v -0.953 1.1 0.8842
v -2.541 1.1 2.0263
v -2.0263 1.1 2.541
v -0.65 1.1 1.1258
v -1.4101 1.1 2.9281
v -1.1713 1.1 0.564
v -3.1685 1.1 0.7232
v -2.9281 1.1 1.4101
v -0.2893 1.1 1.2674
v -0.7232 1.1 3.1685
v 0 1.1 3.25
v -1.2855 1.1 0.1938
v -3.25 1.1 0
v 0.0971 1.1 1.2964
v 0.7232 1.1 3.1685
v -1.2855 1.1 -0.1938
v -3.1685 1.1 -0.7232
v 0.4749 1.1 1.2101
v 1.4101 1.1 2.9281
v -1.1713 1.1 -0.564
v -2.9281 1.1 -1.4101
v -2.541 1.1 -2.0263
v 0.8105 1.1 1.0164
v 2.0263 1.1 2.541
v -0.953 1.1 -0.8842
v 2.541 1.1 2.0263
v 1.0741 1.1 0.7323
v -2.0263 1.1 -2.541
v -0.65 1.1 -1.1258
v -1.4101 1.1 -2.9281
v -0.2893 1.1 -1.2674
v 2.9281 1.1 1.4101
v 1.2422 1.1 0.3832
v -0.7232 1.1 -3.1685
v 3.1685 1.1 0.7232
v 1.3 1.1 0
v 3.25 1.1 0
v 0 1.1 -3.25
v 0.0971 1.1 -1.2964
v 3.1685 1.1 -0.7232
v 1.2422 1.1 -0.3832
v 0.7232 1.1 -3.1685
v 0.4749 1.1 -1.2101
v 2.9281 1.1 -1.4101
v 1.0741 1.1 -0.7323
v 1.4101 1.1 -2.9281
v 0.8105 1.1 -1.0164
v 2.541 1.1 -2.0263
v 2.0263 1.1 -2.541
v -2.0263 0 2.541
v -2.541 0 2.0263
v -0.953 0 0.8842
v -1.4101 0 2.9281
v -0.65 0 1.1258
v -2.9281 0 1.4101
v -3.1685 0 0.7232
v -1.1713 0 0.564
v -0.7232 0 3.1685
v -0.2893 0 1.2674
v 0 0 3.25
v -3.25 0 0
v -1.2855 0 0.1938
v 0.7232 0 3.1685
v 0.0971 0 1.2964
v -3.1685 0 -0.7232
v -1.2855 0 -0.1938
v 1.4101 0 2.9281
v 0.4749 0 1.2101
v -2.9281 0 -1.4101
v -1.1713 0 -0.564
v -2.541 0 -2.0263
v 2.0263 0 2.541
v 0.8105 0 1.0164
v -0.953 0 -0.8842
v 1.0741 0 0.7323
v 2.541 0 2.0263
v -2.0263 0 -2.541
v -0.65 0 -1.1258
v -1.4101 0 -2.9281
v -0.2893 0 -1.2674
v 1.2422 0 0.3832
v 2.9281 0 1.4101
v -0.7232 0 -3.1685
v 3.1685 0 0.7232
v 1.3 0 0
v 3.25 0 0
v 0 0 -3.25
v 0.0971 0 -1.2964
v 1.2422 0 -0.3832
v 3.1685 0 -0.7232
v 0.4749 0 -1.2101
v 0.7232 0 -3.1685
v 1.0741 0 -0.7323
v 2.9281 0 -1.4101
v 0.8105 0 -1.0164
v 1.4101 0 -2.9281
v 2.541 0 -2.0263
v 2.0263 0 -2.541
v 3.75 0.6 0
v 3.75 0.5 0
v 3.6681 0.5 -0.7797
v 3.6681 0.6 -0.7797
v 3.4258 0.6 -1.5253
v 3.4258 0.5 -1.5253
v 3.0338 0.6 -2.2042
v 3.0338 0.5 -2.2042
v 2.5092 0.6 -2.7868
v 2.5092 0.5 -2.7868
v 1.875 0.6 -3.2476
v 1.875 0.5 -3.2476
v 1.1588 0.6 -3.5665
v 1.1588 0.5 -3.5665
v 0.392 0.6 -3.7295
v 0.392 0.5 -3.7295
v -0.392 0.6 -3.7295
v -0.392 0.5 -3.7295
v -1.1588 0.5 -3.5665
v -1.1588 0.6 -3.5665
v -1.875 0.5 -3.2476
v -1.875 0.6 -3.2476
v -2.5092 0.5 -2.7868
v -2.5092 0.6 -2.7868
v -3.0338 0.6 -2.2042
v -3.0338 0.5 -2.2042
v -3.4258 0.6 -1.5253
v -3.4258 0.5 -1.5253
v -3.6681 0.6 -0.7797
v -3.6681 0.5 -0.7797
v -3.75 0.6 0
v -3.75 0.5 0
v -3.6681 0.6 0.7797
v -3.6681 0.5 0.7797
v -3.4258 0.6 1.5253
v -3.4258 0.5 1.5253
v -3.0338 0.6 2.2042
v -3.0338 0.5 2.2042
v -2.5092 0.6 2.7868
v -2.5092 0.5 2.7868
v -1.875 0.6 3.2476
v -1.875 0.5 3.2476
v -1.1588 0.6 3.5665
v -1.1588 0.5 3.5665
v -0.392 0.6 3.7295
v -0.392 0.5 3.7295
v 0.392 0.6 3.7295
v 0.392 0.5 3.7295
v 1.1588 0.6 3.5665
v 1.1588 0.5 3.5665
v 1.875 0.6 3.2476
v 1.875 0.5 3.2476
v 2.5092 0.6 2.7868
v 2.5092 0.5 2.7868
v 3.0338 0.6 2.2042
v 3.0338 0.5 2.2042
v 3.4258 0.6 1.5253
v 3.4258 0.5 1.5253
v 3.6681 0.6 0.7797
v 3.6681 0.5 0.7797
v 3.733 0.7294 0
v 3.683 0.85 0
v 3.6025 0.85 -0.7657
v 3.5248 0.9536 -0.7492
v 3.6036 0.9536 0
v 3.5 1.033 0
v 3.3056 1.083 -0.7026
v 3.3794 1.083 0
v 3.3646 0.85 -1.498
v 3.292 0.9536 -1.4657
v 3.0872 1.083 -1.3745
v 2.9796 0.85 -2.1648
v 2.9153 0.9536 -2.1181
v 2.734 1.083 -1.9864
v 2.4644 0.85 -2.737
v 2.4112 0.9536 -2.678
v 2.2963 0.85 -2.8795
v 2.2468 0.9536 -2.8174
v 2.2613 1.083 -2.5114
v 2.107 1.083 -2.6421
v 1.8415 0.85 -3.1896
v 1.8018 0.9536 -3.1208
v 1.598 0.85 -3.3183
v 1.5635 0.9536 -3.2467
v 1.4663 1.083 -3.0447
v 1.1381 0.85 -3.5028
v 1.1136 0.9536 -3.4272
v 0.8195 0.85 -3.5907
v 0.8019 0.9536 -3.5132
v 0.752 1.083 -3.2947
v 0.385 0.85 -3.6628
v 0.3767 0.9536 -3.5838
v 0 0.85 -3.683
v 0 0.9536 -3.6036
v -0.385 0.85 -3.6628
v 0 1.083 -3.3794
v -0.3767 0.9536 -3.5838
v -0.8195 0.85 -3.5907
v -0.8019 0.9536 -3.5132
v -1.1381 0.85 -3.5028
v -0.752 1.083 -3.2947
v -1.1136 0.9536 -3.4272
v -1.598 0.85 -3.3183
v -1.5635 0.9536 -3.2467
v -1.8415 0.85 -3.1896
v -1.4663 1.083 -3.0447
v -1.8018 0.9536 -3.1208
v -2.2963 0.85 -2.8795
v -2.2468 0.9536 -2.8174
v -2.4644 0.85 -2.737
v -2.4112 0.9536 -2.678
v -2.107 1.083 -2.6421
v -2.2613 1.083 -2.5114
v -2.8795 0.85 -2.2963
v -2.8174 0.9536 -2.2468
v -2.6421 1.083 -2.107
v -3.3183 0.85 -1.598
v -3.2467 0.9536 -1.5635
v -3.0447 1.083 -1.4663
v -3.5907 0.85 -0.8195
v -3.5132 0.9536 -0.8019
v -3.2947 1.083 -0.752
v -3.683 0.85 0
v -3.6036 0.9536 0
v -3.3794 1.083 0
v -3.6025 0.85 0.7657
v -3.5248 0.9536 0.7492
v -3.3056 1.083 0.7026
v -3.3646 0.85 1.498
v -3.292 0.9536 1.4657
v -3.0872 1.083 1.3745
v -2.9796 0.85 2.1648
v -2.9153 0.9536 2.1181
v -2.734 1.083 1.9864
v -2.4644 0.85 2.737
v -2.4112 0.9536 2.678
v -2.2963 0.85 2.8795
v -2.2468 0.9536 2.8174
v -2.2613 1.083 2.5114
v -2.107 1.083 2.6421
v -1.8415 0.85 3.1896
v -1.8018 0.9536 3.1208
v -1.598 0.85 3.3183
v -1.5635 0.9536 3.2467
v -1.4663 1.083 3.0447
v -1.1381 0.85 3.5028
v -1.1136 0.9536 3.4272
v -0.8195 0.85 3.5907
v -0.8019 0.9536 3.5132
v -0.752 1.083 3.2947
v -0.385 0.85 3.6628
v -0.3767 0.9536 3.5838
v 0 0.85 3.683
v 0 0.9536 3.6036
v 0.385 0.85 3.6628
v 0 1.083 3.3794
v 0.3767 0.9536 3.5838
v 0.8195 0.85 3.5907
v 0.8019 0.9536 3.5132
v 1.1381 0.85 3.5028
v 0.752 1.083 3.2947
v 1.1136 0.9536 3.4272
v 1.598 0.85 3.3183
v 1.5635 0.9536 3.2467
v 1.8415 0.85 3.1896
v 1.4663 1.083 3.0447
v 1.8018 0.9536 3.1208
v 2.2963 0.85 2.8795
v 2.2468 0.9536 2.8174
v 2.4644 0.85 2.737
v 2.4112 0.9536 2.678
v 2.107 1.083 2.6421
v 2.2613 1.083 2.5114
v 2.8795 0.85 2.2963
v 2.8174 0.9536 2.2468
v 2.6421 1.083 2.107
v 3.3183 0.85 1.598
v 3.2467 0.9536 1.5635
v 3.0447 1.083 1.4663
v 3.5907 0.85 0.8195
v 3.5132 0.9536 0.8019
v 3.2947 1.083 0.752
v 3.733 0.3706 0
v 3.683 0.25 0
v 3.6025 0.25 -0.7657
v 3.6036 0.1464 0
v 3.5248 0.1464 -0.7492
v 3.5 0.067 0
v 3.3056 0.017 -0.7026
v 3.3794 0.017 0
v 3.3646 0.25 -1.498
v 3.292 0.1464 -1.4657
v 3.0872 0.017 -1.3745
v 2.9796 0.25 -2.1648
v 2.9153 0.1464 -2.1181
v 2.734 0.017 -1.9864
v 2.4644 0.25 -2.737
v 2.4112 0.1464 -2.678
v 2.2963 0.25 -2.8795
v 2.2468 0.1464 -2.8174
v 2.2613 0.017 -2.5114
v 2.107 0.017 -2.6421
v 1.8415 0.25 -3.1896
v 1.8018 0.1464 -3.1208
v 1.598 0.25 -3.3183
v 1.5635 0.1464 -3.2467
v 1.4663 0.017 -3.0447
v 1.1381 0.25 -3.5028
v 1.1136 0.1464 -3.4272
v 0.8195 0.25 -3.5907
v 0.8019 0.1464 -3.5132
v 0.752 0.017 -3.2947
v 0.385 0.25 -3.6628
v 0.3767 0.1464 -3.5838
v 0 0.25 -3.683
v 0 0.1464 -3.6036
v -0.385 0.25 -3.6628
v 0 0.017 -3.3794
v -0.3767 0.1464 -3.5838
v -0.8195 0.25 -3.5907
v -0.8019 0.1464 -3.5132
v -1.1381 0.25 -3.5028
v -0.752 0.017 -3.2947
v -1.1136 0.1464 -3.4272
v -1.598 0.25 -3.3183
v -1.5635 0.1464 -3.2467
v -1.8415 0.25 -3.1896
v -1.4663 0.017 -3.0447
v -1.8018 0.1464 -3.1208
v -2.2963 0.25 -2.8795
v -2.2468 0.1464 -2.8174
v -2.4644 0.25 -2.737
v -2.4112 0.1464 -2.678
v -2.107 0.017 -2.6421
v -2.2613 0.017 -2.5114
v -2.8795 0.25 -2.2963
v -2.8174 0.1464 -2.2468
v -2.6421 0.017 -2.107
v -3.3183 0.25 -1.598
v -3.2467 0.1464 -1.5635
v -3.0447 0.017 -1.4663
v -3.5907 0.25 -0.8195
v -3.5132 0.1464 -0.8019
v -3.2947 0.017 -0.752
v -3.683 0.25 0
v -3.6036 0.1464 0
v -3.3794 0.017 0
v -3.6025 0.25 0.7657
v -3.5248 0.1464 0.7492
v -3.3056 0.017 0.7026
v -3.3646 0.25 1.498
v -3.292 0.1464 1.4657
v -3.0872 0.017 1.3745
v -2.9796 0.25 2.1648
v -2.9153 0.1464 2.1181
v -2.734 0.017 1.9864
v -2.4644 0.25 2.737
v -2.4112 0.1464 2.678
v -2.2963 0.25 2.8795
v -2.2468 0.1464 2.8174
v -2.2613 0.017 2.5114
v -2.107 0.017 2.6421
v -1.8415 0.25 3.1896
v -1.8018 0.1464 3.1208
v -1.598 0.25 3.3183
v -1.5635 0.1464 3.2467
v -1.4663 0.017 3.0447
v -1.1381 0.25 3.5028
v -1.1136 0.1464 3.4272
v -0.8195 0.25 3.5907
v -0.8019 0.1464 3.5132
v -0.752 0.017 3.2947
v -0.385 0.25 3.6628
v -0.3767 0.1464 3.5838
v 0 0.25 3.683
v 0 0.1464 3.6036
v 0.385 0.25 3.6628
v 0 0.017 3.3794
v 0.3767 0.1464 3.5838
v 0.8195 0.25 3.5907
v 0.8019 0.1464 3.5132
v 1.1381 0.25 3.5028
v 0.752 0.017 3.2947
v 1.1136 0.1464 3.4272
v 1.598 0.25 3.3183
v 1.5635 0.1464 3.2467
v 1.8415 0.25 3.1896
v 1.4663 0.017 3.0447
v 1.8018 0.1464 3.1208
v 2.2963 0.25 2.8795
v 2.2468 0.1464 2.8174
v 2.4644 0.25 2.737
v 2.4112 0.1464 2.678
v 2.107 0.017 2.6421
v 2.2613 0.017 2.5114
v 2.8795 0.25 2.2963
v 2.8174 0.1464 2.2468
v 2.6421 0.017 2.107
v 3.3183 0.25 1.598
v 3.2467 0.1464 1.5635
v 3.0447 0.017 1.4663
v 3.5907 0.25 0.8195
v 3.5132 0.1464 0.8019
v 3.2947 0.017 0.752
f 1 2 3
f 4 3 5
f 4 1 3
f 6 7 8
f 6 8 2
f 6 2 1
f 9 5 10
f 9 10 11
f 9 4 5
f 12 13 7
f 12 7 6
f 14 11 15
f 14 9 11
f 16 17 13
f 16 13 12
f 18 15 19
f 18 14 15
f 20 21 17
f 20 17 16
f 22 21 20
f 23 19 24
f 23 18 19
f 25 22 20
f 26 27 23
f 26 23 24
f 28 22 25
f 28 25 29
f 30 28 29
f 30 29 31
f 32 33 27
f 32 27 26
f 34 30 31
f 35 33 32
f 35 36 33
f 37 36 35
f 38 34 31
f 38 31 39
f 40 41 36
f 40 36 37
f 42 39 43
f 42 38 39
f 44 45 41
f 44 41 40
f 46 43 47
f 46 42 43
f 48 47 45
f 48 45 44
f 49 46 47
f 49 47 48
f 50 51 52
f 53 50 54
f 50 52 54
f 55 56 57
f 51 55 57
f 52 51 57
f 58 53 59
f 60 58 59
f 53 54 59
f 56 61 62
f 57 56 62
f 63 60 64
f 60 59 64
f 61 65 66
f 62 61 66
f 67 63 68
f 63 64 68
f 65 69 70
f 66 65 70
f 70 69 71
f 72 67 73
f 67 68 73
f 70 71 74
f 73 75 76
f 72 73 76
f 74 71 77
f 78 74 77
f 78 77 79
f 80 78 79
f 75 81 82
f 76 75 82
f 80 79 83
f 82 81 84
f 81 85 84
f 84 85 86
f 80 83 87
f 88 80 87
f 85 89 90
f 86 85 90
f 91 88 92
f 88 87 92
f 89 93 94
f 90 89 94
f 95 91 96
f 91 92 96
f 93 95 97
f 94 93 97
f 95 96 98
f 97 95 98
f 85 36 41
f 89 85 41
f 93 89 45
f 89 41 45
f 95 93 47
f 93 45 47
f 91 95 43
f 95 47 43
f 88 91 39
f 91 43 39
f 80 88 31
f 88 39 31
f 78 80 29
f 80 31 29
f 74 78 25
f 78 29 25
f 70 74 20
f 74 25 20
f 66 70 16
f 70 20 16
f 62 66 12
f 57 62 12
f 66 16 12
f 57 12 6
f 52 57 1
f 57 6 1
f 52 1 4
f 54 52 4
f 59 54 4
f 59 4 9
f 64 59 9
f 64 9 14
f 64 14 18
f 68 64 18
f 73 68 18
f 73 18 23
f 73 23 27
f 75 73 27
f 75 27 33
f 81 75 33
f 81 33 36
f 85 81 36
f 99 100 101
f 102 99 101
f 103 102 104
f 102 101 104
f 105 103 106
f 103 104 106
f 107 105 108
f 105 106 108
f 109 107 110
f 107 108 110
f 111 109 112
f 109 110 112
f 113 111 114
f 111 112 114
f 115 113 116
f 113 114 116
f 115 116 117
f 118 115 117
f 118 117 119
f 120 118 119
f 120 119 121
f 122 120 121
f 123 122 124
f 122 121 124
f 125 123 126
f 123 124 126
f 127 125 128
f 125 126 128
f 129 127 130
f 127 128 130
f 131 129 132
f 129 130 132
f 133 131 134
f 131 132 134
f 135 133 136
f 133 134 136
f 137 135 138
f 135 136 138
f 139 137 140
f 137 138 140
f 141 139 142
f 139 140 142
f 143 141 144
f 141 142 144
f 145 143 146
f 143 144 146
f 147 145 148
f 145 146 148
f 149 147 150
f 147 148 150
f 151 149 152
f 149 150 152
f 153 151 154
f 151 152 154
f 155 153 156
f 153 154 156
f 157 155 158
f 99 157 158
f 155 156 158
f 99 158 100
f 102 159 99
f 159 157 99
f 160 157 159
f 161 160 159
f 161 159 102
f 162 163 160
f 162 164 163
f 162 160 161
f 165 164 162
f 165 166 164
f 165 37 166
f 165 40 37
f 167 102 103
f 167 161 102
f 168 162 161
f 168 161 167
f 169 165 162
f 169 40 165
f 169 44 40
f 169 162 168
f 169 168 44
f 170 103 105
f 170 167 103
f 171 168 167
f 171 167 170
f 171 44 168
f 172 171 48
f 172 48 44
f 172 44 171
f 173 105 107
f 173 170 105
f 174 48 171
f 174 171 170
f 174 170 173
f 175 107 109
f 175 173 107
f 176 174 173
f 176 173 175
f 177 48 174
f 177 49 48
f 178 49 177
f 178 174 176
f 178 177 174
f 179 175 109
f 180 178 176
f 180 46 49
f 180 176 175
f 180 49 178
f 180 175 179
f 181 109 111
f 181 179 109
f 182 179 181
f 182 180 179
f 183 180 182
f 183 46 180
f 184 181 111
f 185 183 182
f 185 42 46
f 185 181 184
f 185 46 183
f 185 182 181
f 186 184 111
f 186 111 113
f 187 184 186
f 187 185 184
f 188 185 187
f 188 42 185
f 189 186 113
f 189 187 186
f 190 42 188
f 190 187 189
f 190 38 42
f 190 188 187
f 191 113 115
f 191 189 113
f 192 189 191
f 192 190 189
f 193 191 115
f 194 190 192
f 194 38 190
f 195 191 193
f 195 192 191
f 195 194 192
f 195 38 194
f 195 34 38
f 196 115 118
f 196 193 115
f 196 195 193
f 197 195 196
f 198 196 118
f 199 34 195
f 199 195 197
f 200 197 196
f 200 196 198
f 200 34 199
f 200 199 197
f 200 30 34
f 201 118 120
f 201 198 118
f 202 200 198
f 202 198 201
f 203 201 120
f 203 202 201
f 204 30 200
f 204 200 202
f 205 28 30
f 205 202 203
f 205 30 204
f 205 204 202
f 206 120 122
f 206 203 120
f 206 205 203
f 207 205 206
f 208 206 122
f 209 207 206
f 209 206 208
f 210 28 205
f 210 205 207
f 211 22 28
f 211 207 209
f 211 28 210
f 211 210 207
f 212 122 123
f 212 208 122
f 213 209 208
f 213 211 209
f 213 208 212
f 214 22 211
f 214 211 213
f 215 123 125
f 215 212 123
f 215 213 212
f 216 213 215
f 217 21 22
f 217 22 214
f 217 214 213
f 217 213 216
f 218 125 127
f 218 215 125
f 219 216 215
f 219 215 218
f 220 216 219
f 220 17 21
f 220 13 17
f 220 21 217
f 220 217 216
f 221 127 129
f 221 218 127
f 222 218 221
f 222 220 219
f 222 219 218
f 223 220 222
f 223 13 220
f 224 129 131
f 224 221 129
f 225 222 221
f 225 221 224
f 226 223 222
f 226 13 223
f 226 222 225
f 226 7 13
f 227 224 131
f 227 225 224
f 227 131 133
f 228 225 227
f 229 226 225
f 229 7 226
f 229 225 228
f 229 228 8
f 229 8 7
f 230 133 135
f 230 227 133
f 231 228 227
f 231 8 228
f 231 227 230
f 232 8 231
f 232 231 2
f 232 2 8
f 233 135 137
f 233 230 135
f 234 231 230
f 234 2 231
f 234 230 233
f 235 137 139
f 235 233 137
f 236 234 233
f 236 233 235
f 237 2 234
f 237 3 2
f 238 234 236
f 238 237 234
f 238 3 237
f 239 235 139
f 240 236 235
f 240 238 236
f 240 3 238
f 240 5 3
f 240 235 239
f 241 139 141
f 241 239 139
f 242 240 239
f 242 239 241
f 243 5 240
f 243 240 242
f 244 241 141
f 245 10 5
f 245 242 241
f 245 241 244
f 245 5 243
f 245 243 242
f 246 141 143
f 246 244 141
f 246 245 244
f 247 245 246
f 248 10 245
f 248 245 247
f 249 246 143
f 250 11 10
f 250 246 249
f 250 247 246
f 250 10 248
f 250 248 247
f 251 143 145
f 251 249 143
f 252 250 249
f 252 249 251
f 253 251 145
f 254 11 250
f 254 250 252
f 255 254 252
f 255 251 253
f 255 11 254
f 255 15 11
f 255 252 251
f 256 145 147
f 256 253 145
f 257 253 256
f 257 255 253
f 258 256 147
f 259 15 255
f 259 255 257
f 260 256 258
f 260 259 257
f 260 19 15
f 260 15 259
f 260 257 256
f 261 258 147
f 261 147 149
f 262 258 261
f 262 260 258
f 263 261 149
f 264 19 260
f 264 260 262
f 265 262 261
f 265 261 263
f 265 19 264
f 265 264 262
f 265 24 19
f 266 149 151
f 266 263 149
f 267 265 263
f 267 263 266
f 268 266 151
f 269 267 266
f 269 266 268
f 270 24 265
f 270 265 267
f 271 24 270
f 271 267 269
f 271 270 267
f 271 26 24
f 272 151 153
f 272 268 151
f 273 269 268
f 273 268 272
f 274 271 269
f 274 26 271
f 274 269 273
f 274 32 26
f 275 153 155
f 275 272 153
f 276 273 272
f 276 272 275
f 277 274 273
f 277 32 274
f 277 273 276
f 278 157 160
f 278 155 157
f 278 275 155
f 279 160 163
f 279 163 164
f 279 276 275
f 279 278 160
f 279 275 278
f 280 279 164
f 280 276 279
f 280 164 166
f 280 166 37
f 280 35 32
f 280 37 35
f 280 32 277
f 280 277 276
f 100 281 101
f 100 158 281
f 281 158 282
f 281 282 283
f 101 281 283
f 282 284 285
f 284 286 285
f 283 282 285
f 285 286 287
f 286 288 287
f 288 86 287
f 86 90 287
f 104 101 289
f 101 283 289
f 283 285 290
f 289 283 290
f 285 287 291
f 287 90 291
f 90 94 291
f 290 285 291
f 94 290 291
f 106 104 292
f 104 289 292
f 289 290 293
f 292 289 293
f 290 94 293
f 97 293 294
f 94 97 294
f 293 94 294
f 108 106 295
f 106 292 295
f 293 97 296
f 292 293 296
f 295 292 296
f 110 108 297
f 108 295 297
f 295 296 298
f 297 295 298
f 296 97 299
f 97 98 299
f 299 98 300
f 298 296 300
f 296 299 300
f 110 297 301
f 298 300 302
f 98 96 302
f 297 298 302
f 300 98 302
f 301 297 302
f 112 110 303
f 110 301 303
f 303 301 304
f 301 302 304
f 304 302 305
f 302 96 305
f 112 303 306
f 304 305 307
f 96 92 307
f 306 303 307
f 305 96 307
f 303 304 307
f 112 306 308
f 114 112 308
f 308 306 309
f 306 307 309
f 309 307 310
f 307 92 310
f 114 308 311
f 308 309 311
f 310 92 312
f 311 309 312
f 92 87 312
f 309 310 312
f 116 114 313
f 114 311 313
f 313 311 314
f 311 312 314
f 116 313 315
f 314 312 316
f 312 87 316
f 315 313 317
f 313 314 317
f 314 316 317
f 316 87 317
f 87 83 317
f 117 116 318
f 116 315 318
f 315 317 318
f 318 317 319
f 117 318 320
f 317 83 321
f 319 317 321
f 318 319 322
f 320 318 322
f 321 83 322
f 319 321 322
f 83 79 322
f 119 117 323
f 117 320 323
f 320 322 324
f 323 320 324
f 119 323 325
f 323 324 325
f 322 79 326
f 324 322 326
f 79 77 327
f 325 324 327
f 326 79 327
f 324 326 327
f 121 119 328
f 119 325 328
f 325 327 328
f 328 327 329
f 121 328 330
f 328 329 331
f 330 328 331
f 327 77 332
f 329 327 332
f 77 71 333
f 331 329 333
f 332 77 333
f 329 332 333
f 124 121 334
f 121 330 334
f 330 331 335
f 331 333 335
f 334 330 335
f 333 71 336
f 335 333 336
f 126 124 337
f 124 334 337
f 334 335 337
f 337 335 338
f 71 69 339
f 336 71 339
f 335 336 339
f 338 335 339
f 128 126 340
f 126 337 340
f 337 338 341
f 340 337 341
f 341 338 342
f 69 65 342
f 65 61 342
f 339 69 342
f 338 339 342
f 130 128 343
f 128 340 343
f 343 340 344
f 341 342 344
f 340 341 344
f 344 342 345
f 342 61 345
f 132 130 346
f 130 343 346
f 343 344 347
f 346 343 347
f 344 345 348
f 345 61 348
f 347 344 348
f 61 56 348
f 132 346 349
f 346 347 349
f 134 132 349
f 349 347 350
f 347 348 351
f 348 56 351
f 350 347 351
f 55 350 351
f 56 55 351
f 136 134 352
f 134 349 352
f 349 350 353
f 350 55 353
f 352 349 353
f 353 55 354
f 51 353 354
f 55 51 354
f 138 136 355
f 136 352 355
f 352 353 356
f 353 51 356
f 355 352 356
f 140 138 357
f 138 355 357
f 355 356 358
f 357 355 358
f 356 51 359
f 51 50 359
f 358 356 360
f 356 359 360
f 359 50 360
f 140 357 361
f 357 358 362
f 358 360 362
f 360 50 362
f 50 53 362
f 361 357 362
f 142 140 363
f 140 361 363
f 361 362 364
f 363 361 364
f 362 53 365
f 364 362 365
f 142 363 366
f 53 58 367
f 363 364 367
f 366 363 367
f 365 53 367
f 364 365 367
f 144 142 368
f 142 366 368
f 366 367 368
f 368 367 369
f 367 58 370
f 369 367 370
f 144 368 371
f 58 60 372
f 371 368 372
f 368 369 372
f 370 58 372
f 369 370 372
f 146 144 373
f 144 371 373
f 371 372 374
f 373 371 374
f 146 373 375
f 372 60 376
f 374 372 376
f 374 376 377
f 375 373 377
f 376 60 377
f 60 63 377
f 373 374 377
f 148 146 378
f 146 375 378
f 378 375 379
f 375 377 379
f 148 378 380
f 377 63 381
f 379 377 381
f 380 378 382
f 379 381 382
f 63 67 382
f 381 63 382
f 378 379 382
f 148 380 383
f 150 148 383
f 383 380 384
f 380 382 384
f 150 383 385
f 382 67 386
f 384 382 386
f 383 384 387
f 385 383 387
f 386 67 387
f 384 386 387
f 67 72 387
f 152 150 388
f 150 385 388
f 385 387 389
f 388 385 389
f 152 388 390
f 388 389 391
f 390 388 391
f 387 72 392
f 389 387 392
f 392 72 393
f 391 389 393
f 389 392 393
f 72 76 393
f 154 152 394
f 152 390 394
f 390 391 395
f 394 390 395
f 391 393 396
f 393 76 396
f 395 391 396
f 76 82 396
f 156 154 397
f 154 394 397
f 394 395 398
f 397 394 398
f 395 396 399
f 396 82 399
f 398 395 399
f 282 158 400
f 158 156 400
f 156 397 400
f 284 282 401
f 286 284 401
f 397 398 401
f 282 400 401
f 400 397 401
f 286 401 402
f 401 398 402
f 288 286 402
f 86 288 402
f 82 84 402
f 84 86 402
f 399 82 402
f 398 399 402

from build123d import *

# Parameters (mm, degrees)
SKETCH1_R           = 3.75
BOSS_EXTRUDE1_DEPTH = 1.1
SKETCH2_R           = 1.3
CUT_EXTRUDE1_DEPTH  = 2.1
FILLET1_R           = 0.5


with BuildPart() as part:
    # Sketch1 → Boss-Extrude1 (new body)
    with BuildSketch(Plane(origin=(0, 0, 0), x_dir=(1, 0, 0), z_dir=(0, 1, 0))):
        Circle(SKETCH1_R)
    extrude(amount=BOSS_EXTRUDE1_DEPTH)

    # Sketch2 → Cut-Extrude1 (cut, through all)
    with BuildSketch(Plane(origin=(0, 1.1, 0), x_dir=(1, 0, 0), z_dir=(0, 1, 0))):
        Circle(SKETCH2_R)
    extrude(amount=-CUT_EXTRUDE1_DEPTH, mode=Mode.SUBTRACT)

    # Fillet1
    fillet1_edges = [part.edges().sort_by_distance(p)[0] for p in [
        (-3.75, 0, 0),
        (-3.75, 1.1, 0),
    ]]
    fillet(fillet1_edges, radius=FILLET1_R)


solid = part.part
